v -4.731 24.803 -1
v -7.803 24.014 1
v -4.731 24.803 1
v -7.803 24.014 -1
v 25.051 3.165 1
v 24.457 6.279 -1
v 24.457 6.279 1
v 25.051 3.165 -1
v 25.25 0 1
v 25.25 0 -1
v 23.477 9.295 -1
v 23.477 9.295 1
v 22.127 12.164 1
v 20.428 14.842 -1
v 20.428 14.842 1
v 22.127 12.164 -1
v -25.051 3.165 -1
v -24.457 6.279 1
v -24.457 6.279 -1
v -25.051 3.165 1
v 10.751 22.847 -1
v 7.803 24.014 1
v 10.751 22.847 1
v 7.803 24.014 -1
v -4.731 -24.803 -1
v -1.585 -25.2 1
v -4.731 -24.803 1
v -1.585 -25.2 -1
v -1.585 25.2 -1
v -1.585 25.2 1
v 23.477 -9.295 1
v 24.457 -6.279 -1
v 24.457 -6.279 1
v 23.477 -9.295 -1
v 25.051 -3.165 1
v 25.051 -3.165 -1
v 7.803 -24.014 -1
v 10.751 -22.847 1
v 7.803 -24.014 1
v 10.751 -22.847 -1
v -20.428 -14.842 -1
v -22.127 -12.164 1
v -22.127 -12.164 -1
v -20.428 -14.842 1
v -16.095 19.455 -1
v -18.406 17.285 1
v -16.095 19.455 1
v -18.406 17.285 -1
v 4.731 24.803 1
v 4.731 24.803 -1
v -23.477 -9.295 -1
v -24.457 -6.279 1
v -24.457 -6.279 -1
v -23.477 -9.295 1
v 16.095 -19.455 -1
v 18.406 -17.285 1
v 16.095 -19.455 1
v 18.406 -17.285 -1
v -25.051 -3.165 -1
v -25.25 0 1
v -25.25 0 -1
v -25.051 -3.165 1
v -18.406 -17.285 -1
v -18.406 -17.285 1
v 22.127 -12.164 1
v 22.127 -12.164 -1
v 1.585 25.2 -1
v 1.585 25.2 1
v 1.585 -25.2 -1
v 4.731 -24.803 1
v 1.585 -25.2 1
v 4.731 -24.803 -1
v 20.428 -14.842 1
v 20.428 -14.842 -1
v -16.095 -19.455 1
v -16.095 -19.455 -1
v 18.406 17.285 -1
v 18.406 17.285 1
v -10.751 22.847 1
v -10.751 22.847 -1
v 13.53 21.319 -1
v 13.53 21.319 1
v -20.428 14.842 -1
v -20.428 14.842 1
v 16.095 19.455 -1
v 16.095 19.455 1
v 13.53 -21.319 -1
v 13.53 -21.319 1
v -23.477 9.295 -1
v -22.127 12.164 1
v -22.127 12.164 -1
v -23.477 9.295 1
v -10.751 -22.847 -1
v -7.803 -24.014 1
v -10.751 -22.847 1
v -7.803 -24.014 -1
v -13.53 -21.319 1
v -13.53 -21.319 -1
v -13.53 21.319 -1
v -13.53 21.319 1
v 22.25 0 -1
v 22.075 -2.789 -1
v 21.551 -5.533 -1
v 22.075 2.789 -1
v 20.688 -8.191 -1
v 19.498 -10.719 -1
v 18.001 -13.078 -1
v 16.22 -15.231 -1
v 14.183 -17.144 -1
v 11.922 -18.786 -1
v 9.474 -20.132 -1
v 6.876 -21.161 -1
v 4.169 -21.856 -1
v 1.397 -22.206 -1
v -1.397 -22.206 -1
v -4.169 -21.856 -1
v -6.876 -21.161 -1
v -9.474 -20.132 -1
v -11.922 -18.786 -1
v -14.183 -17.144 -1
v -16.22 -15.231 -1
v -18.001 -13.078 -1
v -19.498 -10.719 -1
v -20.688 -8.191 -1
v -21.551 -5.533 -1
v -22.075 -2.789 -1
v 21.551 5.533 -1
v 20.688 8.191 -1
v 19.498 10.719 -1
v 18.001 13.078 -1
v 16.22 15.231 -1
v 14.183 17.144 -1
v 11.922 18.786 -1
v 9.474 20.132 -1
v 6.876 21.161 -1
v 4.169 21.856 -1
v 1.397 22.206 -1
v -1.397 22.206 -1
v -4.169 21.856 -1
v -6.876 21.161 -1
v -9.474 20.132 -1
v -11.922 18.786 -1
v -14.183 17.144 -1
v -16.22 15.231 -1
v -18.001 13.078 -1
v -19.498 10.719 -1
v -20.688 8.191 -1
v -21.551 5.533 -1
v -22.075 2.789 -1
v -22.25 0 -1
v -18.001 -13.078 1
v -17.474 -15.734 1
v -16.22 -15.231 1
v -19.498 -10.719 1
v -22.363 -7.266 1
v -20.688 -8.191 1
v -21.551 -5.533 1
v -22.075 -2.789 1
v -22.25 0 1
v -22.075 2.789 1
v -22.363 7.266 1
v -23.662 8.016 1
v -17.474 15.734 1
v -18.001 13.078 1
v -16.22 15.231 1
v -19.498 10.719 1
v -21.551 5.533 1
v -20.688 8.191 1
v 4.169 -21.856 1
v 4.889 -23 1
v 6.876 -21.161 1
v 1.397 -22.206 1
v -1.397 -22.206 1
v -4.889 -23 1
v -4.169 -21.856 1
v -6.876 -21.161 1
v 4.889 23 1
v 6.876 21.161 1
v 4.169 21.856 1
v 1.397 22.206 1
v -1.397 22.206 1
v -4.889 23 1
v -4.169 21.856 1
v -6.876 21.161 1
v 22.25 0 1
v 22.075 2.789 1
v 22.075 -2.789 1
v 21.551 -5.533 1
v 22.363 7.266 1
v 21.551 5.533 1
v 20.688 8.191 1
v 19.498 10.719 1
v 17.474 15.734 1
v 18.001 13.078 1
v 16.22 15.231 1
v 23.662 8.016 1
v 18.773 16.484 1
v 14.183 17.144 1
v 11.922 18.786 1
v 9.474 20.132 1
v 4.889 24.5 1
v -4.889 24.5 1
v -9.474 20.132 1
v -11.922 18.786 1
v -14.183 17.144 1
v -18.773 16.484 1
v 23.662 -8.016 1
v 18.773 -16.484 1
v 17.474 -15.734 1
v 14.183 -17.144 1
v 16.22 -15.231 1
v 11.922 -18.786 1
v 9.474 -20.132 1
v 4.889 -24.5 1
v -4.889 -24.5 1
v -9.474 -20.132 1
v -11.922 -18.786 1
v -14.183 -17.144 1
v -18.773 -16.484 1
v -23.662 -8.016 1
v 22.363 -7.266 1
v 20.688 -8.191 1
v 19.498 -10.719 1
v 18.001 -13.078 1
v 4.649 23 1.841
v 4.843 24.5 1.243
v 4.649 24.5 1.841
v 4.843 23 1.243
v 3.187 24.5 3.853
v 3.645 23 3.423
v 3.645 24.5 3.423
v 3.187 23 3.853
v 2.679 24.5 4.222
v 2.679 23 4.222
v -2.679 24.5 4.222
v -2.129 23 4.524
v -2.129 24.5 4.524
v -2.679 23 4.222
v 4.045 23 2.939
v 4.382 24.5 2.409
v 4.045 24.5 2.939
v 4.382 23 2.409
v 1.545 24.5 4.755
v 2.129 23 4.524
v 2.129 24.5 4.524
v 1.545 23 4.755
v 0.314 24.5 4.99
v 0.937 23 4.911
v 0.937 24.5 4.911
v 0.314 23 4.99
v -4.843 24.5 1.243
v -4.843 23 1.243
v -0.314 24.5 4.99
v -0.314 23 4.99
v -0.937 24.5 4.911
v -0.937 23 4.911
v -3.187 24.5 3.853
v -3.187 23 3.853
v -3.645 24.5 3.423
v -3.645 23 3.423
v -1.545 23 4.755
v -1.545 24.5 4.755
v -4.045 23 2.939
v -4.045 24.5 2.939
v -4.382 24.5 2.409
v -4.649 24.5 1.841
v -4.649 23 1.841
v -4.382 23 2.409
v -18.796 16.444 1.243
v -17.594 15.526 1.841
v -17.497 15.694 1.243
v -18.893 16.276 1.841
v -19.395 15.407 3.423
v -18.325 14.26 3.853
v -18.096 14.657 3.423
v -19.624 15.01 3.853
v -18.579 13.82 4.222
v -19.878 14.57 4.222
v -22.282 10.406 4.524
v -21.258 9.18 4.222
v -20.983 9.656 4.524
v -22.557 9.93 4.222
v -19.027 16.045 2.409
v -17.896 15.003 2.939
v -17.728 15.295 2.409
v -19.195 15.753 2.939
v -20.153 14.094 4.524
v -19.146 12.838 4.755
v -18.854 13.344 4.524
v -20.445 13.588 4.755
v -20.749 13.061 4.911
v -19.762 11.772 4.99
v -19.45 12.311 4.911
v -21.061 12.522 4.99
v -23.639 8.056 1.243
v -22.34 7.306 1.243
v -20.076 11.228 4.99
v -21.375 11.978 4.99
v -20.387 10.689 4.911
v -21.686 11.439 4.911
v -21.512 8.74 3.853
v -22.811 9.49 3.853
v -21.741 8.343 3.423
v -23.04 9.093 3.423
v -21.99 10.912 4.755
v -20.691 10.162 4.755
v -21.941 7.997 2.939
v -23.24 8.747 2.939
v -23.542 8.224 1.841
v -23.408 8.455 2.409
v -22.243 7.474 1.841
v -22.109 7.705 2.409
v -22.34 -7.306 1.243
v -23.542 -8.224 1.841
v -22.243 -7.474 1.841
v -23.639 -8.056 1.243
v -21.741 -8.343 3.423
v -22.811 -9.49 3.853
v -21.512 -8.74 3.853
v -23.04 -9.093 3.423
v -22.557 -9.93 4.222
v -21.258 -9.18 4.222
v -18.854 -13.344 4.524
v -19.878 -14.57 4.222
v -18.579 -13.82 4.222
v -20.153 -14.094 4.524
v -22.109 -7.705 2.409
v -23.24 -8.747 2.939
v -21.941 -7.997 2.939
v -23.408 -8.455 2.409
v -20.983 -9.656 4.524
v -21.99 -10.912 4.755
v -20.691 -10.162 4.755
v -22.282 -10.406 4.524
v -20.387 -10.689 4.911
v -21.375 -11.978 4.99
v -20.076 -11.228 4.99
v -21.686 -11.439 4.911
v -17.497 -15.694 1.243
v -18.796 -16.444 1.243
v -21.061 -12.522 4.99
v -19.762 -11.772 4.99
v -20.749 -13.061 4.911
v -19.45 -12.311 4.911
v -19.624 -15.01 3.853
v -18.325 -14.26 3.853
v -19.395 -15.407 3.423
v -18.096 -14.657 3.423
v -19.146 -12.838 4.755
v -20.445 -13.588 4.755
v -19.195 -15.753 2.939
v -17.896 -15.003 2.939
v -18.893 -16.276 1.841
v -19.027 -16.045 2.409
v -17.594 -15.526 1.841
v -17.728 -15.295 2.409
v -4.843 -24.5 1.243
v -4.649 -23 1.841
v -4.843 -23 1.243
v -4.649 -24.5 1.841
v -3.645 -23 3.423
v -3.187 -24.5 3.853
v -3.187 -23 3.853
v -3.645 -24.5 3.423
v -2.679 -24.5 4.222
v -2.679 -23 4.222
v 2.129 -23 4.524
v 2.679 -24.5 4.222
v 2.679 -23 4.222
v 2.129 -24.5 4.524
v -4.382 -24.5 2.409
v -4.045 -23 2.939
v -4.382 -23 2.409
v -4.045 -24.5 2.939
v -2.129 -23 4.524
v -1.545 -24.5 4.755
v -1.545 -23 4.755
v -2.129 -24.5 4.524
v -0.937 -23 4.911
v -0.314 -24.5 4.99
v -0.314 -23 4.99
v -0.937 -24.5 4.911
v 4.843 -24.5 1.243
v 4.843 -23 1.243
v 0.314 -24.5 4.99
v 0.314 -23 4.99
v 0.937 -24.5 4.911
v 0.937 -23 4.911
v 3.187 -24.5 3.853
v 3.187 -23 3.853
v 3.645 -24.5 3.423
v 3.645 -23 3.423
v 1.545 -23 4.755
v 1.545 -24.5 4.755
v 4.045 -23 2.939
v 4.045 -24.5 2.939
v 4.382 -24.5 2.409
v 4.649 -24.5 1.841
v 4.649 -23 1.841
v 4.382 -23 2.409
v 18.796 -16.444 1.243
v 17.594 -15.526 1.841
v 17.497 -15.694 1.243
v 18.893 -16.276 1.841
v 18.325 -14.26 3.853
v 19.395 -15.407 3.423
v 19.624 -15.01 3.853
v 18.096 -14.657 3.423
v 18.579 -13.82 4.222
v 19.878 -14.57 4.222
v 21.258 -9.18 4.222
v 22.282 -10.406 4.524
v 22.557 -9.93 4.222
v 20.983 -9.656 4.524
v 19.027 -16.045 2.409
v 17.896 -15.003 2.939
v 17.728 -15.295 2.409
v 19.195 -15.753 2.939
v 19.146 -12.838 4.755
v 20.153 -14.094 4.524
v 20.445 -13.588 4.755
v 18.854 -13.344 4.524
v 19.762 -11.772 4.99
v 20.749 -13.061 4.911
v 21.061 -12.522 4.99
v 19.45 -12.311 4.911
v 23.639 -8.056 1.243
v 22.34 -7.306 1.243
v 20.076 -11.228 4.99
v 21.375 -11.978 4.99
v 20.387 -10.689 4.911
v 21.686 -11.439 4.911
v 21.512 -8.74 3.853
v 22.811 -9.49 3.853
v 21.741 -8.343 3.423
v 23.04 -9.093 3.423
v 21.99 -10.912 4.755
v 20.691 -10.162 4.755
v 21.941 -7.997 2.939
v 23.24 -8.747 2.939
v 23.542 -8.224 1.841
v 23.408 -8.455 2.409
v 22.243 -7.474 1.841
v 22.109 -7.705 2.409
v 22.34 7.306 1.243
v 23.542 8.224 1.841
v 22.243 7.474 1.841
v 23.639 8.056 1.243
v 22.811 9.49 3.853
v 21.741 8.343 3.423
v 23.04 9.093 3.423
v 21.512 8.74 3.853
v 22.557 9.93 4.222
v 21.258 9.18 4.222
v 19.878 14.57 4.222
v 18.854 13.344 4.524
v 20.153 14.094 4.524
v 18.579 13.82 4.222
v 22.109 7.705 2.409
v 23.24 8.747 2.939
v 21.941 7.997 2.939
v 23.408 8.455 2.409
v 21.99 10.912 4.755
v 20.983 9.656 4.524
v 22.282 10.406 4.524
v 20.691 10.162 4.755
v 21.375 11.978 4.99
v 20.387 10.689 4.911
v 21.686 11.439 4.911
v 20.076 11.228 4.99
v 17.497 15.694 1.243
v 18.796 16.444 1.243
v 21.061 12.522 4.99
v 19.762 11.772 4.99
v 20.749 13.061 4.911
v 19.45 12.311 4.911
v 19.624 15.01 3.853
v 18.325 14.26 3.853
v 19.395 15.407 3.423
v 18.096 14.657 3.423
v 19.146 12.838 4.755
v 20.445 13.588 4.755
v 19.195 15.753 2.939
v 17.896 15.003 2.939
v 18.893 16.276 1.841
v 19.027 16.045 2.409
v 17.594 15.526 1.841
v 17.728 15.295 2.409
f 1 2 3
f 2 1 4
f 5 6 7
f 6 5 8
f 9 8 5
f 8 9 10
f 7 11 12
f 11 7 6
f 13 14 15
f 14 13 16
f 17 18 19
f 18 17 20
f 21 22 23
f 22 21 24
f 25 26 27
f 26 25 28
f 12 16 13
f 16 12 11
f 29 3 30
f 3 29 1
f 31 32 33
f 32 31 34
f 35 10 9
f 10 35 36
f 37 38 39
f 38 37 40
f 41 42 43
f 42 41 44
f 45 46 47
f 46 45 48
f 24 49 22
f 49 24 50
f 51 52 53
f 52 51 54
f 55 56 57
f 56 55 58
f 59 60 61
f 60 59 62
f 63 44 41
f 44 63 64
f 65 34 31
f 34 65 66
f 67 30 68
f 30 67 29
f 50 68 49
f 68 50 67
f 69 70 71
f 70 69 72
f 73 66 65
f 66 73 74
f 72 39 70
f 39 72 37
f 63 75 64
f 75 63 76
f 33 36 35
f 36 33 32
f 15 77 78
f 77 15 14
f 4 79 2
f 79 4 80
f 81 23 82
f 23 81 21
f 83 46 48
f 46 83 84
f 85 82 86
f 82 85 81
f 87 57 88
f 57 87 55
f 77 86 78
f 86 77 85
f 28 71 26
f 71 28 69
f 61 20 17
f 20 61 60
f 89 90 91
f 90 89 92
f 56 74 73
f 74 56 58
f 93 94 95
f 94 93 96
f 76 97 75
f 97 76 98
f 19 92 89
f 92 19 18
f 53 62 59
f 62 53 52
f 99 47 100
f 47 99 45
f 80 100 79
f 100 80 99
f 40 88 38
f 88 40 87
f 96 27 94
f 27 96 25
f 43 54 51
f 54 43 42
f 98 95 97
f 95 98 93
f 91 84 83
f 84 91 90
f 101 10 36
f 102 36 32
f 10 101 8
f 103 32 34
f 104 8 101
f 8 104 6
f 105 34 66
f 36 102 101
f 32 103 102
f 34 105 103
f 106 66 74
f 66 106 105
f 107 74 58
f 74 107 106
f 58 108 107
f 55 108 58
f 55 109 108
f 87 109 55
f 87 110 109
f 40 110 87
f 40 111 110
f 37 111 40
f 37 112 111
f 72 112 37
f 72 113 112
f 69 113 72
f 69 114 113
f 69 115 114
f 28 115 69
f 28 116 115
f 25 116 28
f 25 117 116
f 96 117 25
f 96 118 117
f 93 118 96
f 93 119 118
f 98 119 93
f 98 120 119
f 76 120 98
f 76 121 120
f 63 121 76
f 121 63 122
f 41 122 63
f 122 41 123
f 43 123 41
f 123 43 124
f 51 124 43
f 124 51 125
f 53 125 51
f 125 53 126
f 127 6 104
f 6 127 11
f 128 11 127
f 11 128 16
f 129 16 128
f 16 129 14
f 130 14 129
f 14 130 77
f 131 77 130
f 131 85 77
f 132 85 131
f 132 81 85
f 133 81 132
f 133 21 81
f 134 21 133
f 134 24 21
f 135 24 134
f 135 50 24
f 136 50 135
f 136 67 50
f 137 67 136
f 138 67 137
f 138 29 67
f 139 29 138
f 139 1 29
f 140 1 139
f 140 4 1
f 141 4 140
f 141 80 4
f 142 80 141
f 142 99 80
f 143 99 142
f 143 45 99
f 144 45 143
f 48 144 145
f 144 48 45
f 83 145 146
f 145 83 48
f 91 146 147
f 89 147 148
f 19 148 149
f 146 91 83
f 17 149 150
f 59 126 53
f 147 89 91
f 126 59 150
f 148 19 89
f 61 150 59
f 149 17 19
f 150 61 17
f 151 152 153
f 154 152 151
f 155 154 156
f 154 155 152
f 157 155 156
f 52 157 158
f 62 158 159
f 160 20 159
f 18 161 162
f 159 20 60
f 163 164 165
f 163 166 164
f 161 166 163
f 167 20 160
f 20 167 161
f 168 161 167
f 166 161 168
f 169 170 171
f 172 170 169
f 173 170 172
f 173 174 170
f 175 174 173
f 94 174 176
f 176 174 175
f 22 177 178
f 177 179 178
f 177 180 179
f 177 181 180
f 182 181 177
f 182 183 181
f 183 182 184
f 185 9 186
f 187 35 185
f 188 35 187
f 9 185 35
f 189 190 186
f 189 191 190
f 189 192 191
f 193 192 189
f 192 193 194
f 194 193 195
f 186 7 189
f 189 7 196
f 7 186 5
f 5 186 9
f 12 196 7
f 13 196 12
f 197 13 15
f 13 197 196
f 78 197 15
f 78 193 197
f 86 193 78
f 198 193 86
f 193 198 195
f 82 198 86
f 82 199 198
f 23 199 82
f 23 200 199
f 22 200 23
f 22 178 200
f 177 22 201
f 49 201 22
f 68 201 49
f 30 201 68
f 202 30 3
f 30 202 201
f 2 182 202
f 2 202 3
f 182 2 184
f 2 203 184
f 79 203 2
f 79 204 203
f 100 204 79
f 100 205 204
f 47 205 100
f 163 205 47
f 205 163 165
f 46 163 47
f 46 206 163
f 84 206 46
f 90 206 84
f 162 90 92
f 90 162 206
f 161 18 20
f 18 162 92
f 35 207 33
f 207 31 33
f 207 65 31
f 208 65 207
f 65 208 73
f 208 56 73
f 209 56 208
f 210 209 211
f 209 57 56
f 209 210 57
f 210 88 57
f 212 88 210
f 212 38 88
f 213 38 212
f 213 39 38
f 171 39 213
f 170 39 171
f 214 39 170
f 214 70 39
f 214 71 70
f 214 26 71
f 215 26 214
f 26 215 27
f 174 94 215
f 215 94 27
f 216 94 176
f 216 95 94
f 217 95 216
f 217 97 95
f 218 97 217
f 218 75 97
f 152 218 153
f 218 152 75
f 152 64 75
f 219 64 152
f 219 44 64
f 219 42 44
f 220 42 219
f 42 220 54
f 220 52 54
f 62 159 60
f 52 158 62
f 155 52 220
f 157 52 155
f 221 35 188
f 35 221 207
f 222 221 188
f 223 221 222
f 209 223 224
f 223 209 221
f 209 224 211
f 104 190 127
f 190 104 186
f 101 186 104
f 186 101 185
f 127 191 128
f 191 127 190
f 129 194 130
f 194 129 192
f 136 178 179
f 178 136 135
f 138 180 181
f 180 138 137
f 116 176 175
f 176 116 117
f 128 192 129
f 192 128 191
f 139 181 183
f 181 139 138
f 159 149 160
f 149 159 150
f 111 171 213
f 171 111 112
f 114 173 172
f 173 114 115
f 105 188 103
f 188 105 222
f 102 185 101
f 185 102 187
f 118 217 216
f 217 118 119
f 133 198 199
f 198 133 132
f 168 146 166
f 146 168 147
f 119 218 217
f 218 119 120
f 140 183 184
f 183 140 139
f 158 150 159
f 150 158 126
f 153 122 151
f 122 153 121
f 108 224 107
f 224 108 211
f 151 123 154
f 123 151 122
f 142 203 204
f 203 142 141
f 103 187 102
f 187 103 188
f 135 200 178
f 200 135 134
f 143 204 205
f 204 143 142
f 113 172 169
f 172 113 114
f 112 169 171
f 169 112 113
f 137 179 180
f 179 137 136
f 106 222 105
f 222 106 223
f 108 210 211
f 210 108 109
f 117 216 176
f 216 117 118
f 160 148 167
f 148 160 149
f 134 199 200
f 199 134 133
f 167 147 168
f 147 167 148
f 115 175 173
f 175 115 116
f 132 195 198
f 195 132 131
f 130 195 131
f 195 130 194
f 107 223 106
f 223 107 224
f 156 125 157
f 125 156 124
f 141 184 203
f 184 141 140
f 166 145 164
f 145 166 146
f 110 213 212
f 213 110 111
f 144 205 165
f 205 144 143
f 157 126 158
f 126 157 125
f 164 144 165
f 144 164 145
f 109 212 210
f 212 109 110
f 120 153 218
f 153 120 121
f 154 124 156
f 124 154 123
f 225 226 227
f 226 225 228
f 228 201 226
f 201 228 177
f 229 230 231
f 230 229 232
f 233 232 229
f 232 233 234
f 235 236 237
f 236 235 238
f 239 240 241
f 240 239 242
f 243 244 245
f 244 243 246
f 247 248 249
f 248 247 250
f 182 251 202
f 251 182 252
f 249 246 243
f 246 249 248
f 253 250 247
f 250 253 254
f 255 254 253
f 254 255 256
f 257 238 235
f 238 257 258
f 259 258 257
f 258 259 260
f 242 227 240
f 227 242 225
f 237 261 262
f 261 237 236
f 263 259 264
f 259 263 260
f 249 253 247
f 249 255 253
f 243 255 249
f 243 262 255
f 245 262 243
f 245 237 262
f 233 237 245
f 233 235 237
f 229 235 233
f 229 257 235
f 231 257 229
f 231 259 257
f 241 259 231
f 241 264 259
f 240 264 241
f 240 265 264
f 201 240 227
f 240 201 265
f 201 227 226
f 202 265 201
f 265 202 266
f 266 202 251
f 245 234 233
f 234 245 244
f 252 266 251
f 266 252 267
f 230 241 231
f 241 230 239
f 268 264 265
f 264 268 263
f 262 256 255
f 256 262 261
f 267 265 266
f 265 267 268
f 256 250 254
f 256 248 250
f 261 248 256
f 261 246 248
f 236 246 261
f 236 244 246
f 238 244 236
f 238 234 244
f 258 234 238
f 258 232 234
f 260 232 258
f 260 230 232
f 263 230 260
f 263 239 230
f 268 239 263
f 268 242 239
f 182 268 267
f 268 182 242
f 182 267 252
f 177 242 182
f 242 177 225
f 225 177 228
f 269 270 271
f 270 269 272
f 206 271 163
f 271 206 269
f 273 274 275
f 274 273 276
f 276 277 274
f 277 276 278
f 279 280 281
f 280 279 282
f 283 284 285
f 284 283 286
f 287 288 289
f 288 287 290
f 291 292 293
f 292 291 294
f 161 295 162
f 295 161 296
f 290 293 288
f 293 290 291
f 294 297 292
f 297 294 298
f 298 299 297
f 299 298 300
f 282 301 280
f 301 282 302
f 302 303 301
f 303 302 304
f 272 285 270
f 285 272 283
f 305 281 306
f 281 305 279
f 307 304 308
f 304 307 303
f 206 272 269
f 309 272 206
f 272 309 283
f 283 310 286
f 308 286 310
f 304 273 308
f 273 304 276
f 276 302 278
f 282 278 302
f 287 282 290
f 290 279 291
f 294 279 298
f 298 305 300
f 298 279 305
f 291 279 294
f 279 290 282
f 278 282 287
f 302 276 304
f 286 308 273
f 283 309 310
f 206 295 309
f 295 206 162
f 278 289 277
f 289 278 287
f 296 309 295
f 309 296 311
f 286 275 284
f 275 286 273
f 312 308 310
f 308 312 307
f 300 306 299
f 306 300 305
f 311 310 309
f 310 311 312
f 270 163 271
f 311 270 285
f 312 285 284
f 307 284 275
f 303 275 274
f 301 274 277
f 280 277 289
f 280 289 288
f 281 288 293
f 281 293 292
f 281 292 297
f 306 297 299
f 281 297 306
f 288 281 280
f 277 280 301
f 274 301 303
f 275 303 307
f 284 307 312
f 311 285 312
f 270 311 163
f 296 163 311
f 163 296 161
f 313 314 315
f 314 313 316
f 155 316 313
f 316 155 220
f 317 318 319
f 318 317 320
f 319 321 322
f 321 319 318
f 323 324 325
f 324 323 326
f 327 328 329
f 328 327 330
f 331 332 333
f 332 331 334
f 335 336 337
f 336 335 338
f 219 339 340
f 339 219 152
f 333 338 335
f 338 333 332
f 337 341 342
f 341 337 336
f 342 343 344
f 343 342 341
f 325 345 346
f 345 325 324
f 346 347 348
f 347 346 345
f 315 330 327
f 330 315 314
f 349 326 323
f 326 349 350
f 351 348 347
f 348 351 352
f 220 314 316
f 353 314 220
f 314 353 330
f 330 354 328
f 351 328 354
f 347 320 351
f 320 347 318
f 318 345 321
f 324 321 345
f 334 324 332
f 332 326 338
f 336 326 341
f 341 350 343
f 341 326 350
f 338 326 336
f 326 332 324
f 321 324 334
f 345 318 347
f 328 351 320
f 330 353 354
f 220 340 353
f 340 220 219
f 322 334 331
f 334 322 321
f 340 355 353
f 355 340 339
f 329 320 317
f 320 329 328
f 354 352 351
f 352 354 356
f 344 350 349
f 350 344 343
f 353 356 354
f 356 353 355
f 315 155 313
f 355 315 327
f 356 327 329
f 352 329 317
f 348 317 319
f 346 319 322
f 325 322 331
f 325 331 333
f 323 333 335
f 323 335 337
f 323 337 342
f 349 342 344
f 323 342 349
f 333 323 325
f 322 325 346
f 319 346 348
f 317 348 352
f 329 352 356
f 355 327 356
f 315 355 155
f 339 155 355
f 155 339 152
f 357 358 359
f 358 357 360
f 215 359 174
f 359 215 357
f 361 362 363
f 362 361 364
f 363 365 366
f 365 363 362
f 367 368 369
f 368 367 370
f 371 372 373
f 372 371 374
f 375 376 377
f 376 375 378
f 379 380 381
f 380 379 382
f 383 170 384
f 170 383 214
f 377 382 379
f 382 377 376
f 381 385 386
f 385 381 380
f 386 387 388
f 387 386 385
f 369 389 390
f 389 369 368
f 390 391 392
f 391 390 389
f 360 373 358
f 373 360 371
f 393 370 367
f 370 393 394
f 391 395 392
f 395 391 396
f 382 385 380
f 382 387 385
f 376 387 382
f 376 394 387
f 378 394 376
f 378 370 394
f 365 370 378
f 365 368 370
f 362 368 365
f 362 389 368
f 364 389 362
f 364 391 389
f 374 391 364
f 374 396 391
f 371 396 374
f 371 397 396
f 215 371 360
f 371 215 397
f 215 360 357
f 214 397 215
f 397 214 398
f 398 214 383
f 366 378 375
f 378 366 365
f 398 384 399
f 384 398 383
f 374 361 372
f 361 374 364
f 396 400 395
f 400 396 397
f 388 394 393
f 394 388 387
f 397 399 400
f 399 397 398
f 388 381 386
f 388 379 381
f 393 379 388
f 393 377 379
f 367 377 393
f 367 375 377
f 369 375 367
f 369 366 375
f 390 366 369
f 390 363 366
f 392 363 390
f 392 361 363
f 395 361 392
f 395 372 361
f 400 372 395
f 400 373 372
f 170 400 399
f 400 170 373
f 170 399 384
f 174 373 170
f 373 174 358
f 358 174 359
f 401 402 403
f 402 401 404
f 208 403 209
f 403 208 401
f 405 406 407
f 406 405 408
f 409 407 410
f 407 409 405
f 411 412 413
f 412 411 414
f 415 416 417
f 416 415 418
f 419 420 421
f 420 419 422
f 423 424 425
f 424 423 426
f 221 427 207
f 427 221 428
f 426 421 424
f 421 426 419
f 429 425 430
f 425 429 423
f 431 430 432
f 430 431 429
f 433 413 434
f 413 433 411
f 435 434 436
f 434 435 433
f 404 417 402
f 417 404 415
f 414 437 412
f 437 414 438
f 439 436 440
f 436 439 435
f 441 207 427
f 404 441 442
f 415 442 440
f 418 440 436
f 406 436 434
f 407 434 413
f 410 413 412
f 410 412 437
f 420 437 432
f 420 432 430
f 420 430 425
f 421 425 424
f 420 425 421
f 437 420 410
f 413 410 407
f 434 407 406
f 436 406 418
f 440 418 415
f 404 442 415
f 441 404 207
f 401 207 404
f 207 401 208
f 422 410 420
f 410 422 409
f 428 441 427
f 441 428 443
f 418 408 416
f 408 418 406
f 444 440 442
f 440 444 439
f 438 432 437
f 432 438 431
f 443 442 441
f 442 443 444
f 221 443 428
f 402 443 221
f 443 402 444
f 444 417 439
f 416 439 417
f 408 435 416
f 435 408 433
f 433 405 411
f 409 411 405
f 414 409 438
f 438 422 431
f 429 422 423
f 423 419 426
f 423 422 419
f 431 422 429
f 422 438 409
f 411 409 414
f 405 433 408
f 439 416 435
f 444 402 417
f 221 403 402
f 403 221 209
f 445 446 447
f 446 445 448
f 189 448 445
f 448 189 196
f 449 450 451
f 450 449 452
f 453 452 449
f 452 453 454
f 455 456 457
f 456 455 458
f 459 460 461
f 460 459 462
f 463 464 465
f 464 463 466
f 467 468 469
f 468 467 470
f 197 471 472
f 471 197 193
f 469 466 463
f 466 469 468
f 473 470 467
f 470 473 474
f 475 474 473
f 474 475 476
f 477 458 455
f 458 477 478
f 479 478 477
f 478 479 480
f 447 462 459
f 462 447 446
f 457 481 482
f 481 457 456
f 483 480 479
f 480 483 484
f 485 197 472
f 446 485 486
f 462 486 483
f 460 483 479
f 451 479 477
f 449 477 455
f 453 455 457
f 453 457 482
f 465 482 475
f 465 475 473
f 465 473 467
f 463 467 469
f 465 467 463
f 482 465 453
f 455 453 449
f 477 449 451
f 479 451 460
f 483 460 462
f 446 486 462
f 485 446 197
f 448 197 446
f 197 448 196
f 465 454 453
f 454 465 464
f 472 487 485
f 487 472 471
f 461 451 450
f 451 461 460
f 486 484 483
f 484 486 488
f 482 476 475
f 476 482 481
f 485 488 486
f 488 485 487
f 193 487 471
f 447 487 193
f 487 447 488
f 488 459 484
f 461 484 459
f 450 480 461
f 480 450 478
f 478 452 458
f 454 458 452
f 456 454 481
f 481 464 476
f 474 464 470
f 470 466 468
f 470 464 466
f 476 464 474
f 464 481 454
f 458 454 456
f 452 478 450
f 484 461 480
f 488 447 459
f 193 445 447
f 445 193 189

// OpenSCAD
$fn = 50;
ring_h = 2;
ring_w = 3;
inner_d = 44.5;
outer_d = inner_d + ring_w * 2;
roller_r = 5;


difference() {
  cylinder(d=outer_d, h=ring_h, center=true);
  cylinder(d=inner_d, h=ring_h, center=true);
}

step = 360/6;
for(i=[0:step:360]) {
  rotate([0, 0, i]) {
    translate([0, (outer_d-ring_w)/2, 0]) {
      difference() {
        rotate([90, 0, 0]) {
          cylinder(r=roller_r, h=ring_w/2, center=true);
        }
        translate([0, 0, -roller_r/2]) {
          cube([roller_r*2, ring_w/2, roller_r], center=true);
        }
      }
    }
  }
}
